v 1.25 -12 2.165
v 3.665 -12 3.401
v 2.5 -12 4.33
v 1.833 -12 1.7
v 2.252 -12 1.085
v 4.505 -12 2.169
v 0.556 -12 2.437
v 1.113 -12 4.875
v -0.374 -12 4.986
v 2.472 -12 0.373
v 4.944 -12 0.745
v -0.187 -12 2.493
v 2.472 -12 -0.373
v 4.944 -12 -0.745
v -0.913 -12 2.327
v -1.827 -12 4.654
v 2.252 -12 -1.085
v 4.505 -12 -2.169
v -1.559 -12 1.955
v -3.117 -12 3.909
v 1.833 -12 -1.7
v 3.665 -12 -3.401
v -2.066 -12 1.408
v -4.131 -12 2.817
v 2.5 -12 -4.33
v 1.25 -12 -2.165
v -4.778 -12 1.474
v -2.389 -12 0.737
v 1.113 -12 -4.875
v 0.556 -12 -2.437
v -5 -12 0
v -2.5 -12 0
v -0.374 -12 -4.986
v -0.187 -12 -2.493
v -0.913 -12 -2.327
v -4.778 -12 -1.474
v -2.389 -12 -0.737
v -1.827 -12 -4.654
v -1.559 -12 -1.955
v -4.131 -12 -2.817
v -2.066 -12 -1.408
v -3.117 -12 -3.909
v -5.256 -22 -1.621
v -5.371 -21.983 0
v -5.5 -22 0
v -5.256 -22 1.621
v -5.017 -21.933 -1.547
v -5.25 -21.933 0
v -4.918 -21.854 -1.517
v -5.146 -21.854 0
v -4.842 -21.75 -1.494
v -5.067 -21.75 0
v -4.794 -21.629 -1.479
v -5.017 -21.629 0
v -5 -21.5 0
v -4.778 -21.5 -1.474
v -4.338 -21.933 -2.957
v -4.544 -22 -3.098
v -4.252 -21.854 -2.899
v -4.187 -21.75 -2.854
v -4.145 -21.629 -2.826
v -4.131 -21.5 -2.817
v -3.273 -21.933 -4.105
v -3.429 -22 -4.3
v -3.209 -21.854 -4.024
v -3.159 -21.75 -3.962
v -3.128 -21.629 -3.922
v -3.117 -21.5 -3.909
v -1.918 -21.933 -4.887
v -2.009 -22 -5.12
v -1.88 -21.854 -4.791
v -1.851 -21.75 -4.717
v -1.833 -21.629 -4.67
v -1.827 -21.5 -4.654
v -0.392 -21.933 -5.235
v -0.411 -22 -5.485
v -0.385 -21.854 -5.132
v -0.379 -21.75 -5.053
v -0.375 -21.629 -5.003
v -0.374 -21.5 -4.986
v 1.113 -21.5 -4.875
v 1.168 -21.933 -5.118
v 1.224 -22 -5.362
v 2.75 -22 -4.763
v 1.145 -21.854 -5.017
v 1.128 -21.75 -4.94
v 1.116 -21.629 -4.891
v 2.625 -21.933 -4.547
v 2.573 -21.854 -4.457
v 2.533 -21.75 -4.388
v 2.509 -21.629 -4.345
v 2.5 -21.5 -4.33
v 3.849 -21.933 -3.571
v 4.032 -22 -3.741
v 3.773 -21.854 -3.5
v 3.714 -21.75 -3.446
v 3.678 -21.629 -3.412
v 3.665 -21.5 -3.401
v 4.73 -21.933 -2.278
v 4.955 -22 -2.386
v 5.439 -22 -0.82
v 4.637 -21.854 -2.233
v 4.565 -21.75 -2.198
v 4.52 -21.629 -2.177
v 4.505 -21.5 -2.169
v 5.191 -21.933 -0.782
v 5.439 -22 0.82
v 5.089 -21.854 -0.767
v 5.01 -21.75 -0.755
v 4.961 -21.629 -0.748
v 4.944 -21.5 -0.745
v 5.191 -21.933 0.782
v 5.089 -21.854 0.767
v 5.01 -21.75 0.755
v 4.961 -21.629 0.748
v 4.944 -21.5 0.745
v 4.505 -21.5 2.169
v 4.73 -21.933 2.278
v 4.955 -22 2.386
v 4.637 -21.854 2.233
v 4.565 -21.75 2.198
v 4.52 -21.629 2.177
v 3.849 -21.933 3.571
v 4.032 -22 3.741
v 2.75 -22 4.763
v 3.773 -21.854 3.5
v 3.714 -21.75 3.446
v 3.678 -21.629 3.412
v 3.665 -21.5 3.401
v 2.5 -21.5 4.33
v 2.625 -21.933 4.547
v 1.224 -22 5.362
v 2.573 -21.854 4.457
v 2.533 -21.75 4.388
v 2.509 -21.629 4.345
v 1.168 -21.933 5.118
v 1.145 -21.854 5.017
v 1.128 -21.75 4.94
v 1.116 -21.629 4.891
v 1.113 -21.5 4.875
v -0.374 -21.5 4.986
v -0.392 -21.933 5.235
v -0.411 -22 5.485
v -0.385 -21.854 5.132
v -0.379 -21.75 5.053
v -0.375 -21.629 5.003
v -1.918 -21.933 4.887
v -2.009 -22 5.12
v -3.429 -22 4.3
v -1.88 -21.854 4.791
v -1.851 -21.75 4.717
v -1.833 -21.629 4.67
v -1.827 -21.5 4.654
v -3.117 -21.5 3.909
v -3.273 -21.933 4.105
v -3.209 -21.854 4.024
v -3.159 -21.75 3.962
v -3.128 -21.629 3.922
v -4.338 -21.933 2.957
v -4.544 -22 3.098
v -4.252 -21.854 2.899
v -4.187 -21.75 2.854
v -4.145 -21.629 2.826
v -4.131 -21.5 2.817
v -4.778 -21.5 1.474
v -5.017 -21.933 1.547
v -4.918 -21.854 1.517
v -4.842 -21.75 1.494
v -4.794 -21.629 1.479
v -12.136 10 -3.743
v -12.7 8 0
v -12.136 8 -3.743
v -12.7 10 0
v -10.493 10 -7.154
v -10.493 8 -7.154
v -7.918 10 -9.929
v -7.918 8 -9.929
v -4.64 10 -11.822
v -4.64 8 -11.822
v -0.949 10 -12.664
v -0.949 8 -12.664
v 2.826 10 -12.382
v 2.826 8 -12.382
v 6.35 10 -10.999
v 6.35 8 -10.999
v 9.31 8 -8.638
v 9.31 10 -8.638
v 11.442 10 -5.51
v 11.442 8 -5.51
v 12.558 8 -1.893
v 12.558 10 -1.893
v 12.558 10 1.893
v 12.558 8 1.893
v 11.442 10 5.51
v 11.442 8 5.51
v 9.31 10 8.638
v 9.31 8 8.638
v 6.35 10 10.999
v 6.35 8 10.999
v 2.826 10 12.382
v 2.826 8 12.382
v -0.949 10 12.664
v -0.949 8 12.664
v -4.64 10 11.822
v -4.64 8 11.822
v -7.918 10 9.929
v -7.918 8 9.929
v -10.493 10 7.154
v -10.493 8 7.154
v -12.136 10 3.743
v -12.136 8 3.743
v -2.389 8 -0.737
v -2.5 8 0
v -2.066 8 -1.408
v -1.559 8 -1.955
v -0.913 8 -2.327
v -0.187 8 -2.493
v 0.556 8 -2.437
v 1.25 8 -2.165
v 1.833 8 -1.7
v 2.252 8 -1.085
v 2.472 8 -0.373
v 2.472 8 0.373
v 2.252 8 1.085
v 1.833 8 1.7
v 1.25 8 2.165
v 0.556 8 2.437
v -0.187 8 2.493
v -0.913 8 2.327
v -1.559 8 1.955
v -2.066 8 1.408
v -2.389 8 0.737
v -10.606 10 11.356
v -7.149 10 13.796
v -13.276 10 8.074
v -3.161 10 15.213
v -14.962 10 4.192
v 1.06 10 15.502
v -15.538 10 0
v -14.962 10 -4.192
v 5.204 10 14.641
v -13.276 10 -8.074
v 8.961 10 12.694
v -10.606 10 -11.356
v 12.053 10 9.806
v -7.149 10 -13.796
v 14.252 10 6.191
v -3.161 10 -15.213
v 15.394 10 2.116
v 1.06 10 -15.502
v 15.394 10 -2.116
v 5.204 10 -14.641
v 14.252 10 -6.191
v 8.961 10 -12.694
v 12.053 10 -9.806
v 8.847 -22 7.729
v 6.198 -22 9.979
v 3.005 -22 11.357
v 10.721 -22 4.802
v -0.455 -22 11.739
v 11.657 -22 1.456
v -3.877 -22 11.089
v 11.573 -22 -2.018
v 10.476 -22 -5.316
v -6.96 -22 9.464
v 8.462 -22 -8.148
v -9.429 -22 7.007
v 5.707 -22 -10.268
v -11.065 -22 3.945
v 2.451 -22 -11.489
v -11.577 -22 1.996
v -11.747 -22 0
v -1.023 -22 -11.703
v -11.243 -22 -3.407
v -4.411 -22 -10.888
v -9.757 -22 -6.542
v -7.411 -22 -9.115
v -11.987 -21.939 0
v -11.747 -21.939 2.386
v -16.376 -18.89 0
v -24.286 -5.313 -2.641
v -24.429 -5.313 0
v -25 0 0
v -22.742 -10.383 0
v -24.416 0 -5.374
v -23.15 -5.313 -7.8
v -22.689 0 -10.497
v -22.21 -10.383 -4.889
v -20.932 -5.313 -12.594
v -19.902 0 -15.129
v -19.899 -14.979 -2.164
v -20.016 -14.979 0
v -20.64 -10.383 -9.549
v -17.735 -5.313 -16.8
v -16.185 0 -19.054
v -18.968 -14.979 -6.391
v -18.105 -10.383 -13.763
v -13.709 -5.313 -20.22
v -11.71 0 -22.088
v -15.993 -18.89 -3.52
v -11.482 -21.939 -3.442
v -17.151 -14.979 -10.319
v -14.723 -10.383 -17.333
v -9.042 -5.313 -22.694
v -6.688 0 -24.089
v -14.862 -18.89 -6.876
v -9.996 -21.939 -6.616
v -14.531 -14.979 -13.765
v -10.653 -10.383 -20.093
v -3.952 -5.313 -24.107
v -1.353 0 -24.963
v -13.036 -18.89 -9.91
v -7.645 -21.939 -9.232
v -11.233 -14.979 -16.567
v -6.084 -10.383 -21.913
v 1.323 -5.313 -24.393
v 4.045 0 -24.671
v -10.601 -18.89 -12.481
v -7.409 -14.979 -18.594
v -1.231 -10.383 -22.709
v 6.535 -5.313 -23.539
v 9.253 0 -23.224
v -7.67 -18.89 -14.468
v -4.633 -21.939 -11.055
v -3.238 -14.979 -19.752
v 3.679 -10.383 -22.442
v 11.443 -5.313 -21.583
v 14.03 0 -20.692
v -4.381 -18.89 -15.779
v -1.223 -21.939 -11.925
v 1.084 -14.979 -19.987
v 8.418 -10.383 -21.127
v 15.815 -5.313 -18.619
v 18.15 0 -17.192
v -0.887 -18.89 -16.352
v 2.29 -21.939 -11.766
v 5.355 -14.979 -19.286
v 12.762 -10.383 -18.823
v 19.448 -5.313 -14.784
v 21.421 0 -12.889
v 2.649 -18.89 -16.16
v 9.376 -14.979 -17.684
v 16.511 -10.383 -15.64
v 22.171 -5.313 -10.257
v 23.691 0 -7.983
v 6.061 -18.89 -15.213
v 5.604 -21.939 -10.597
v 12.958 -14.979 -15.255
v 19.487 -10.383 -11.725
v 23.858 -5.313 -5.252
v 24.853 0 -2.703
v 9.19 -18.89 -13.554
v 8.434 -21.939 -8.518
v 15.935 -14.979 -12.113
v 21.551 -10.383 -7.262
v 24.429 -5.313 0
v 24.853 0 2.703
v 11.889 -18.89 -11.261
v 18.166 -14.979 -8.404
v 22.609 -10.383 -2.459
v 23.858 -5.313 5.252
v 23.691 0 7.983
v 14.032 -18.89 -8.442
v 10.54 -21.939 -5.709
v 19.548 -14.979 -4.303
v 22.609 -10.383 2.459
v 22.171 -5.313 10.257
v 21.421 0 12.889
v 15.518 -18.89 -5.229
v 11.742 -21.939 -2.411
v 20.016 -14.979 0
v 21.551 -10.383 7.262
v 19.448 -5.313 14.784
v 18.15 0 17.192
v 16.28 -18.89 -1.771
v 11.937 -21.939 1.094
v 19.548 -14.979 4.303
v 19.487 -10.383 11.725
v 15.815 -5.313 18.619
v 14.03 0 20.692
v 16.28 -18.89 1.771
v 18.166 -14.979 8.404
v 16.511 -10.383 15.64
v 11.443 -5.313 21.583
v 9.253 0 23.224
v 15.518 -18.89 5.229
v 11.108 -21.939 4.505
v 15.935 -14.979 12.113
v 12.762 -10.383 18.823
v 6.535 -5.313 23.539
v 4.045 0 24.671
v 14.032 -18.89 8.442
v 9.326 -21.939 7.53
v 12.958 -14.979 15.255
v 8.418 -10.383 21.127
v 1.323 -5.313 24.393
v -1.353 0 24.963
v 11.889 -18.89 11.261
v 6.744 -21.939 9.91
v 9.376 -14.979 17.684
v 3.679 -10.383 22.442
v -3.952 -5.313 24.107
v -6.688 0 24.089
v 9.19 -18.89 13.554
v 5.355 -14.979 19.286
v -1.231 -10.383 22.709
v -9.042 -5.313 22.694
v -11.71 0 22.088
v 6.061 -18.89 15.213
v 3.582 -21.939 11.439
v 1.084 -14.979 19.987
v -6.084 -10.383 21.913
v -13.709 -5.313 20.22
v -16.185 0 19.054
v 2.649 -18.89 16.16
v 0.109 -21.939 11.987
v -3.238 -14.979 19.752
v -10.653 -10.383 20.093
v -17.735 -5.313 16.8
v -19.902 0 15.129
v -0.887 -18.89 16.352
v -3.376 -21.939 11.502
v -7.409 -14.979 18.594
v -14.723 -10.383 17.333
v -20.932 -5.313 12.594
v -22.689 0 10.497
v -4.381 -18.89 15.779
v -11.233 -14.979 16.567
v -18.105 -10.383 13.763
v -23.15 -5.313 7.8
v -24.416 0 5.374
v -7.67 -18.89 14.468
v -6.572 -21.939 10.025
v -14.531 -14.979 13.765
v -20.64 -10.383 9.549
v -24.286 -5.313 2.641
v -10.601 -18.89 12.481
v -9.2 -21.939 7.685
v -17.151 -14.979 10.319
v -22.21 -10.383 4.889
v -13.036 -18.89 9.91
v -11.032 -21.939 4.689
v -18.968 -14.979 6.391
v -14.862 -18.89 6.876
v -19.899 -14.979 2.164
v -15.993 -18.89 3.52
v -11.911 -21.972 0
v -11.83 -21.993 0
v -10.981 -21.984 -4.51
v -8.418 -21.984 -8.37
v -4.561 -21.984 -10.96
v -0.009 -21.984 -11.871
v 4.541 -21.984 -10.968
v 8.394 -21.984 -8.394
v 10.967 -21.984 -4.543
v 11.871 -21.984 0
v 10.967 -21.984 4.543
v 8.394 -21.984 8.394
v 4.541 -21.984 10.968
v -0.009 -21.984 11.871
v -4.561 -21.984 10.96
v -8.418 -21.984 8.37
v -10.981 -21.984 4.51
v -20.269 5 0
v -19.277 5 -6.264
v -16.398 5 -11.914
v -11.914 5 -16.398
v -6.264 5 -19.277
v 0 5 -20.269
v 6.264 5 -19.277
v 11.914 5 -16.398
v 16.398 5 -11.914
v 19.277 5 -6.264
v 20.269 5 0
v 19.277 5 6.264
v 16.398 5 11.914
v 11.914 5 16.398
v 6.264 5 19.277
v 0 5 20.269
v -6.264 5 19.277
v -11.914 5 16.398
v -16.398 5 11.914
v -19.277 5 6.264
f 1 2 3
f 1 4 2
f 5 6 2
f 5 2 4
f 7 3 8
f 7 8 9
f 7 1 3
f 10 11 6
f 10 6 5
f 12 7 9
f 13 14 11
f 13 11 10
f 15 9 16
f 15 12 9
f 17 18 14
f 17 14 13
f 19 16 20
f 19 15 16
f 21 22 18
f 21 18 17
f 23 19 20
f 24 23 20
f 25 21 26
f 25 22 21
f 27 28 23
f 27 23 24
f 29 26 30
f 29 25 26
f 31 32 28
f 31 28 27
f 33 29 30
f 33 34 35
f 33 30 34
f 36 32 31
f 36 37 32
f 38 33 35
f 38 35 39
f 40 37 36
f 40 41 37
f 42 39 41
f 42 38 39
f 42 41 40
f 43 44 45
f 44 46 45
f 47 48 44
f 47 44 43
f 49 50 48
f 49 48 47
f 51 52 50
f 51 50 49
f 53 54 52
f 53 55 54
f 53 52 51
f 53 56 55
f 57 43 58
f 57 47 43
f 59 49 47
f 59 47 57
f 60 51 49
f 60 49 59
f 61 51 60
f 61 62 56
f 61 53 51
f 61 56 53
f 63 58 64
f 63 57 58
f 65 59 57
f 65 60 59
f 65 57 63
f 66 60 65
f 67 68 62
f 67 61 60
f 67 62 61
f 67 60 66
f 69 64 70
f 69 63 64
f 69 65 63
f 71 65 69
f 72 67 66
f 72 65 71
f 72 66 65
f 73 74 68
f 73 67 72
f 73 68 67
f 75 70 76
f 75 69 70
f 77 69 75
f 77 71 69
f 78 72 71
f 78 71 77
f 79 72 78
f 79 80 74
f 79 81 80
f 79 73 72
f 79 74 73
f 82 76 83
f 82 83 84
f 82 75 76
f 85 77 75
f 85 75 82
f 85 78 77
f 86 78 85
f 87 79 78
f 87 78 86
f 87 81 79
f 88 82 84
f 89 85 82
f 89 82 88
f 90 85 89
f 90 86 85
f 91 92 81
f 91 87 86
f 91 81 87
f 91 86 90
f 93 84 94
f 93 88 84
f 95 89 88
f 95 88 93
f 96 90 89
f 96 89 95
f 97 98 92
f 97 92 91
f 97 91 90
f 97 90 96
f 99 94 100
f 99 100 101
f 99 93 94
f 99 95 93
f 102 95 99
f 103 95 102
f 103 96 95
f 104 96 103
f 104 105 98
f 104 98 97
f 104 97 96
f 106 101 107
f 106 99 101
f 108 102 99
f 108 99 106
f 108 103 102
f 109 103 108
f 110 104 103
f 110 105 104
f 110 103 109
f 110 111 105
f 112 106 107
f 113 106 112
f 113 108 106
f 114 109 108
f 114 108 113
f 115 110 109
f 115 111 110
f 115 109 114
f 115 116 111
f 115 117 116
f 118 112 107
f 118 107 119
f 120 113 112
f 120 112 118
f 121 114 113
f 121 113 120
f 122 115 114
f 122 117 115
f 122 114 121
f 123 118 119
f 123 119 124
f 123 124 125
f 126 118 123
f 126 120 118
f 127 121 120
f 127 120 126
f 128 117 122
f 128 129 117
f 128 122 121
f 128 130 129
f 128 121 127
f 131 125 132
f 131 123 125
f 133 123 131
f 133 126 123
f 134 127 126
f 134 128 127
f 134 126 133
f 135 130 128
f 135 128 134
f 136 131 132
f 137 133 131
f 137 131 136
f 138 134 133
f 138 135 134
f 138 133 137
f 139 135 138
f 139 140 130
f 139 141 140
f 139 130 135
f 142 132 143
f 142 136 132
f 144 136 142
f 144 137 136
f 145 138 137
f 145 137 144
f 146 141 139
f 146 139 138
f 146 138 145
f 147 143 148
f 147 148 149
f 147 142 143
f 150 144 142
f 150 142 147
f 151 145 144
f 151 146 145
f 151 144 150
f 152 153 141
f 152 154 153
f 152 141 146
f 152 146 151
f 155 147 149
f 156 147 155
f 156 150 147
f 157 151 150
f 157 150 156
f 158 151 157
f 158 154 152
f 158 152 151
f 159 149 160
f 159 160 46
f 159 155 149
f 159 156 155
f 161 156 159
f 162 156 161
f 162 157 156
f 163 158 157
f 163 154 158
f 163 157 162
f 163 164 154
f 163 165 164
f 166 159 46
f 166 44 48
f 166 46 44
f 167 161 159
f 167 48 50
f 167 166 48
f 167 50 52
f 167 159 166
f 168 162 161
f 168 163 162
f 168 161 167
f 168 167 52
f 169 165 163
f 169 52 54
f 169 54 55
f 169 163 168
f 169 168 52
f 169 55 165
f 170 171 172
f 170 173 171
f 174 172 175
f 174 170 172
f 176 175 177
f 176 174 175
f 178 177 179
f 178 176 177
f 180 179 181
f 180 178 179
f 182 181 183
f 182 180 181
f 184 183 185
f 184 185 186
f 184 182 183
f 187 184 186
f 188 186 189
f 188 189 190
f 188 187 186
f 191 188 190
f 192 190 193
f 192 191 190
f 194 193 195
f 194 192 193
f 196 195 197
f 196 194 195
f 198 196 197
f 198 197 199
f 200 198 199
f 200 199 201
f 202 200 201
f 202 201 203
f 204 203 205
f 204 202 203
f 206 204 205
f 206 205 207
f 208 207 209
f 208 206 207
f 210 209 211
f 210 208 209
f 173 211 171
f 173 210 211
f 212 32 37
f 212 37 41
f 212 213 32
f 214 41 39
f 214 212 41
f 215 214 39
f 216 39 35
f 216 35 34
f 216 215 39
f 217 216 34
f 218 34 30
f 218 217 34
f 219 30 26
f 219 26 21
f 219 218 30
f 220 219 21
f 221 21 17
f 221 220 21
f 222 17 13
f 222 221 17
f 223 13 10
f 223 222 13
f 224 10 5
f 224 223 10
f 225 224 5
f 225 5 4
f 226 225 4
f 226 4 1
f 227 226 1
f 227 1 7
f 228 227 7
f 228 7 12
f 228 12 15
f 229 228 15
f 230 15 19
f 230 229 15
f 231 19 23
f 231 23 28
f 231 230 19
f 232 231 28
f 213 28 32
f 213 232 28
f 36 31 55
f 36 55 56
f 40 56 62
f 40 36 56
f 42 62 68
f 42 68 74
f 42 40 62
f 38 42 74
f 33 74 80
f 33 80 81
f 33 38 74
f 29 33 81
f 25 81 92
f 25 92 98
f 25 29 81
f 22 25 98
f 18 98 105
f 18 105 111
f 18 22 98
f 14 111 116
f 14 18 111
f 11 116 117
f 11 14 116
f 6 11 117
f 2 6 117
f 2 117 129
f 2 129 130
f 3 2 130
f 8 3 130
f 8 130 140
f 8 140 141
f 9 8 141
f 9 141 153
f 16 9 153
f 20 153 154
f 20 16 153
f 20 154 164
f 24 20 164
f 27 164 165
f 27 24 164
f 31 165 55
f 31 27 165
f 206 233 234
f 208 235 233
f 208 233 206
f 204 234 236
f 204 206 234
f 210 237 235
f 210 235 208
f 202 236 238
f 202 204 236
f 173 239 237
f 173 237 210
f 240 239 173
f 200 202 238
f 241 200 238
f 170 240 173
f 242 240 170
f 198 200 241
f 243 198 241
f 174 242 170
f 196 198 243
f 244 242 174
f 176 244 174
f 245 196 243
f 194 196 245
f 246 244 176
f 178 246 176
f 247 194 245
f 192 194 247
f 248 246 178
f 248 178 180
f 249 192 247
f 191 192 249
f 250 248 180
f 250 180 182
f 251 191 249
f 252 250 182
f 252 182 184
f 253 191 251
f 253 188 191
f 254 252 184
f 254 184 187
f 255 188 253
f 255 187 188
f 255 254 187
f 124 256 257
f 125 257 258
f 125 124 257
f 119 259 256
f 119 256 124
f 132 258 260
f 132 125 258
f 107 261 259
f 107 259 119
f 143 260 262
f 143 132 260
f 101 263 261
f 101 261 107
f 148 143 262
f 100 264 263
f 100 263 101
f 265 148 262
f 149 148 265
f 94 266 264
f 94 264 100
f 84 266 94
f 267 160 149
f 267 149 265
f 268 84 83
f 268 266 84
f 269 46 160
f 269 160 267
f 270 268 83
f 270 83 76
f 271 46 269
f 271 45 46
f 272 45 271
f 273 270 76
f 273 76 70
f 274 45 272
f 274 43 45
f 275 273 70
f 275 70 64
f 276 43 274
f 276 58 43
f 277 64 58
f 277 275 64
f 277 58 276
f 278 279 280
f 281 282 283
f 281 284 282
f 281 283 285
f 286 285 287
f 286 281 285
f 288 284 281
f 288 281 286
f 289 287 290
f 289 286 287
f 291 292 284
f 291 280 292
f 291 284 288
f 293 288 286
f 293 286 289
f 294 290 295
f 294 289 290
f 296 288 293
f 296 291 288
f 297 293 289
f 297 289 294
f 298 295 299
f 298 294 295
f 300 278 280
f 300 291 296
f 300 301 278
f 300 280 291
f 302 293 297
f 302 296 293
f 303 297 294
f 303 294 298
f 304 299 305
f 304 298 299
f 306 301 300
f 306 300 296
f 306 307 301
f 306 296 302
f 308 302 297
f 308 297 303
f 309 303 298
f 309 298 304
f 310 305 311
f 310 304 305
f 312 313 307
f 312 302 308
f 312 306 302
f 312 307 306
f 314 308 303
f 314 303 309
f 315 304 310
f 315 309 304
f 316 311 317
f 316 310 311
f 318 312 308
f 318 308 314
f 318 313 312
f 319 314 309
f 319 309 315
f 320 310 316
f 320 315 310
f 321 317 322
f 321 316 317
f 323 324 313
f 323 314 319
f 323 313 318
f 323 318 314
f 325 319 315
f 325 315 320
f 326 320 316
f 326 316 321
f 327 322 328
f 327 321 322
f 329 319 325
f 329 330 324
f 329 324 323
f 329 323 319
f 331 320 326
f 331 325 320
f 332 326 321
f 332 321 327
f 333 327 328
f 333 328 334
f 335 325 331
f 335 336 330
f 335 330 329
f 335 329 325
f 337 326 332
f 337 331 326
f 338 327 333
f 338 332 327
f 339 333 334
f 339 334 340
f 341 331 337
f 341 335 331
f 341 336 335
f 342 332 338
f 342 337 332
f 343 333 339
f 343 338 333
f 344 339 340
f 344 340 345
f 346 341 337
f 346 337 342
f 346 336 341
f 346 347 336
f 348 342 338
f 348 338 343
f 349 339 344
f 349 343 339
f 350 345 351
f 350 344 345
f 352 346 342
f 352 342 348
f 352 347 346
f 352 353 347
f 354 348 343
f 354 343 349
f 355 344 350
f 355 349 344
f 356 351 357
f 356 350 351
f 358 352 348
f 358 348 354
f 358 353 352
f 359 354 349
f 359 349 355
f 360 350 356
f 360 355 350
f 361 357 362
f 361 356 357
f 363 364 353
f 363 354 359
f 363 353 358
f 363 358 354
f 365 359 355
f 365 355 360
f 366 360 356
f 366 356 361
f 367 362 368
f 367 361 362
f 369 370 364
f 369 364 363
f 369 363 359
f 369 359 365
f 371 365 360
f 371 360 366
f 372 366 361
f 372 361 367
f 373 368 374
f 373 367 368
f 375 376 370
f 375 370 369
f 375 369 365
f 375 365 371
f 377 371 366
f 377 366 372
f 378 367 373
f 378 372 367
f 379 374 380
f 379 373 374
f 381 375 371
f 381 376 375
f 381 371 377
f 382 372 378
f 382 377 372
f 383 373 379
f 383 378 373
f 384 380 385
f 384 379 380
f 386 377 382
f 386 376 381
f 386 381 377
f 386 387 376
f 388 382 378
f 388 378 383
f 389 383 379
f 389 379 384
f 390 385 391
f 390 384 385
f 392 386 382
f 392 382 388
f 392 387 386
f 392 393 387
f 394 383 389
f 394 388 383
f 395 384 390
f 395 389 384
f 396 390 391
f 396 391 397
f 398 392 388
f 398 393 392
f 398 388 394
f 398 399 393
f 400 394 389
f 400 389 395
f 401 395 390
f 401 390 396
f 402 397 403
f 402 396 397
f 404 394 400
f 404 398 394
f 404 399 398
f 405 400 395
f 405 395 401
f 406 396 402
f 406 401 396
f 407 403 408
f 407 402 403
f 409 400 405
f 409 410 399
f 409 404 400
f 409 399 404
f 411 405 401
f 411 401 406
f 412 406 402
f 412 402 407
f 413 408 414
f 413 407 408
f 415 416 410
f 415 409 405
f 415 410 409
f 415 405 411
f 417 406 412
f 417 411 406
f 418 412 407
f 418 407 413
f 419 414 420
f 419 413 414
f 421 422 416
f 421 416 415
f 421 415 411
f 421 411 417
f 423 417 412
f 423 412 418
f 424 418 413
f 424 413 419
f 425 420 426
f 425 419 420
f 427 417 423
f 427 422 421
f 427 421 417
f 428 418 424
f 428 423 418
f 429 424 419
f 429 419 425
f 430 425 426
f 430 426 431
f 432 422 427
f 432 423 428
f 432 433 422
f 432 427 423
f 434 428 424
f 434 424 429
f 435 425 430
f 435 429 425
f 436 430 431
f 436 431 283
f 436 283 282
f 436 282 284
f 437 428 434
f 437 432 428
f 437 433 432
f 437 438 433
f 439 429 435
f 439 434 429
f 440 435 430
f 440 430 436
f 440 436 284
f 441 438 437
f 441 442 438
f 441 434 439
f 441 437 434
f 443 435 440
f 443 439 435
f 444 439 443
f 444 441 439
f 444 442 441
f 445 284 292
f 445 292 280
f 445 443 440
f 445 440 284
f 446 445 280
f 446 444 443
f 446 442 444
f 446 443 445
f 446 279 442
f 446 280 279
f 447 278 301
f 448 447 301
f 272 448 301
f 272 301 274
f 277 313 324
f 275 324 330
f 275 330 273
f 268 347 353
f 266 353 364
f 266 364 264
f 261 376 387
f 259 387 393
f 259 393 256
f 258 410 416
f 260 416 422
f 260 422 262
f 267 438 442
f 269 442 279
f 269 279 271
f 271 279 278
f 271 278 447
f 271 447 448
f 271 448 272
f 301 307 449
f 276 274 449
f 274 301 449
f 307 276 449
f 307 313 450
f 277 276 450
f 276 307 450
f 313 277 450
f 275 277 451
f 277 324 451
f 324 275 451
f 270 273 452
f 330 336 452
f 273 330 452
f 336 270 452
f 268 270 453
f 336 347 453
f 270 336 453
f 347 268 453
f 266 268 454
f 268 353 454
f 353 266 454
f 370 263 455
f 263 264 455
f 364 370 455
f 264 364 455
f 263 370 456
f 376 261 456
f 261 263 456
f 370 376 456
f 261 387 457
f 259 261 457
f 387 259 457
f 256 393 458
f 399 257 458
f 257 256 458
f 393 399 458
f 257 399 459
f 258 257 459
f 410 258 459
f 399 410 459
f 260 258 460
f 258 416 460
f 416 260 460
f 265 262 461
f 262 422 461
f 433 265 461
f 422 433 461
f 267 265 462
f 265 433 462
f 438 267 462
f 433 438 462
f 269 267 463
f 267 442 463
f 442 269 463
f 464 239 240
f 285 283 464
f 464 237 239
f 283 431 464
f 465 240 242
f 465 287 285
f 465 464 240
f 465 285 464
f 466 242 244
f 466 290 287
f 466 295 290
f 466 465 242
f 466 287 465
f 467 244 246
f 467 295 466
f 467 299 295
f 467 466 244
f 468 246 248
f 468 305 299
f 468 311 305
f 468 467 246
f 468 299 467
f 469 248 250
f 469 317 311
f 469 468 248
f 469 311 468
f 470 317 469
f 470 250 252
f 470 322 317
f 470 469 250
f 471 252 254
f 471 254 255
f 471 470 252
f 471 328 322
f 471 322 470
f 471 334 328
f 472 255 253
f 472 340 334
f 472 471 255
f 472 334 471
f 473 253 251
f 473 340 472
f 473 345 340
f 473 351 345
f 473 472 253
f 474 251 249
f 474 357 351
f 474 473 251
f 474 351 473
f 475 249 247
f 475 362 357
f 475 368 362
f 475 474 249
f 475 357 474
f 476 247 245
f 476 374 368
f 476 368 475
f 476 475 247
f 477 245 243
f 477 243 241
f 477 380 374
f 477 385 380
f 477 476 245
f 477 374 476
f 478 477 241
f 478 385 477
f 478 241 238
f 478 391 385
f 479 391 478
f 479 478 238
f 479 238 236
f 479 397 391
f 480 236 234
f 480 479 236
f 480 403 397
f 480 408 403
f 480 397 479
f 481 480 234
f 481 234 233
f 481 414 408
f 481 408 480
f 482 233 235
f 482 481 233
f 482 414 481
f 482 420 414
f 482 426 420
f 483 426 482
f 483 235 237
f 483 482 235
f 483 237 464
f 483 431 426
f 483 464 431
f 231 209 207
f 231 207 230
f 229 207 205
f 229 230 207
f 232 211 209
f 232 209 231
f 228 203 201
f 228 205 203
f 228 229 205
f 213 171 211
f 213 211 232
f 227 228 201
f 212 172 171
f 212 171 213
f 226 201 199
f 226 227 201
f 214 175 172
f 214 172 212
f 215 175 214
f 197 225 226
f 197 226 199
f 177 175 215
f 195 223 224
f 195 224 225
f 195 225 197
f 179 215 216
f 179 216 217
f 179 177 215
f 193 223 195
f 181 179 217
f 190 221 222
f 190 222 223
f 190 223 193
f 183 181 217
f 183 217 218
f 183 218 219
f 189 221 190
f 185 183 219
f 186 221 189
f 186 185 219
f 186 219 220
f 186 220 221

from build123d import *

# Parameters (mm, degrees)
FILLET1_R = 0.5


with BuildPart() as part:
    # Sketch1 → Revolve1 (revolve)
    with BuildSketch(Plane.XY):
        with BuildLine():
            Line((-15.538461538, 10), (-25, 0))
            ThreePointArc((-25, 0), (-21.46926352, -12.809009482), (-11.874342087, -22))
            Line((-11.874342087, -22), (-5, -22))
            Line((-5, -22), (-5, -12))
            Line((-5, -12), (-2.5, -12))
            Line((-2.5, -12), (-2.5, 8))
            Line((-2.5, 8), (-12.7, 8))
            Line((-12.7, 8), (-12.7, 10))
            Line((-12.7, 10), (-15.538461538, 10))
        make_face()
    revolve(axis=Axis((0, 0, 0), (0, -1, 0)))

    # Fillet1
    fillet1_edges = [part.edges().sort_by_distance(p)[0] for p in [
        (5, -22, 0),
        (11.874342087, -22, 0),
    ]]
    fillet(fillet1_edges, radius=FILLET1_R)


solid = part.part
